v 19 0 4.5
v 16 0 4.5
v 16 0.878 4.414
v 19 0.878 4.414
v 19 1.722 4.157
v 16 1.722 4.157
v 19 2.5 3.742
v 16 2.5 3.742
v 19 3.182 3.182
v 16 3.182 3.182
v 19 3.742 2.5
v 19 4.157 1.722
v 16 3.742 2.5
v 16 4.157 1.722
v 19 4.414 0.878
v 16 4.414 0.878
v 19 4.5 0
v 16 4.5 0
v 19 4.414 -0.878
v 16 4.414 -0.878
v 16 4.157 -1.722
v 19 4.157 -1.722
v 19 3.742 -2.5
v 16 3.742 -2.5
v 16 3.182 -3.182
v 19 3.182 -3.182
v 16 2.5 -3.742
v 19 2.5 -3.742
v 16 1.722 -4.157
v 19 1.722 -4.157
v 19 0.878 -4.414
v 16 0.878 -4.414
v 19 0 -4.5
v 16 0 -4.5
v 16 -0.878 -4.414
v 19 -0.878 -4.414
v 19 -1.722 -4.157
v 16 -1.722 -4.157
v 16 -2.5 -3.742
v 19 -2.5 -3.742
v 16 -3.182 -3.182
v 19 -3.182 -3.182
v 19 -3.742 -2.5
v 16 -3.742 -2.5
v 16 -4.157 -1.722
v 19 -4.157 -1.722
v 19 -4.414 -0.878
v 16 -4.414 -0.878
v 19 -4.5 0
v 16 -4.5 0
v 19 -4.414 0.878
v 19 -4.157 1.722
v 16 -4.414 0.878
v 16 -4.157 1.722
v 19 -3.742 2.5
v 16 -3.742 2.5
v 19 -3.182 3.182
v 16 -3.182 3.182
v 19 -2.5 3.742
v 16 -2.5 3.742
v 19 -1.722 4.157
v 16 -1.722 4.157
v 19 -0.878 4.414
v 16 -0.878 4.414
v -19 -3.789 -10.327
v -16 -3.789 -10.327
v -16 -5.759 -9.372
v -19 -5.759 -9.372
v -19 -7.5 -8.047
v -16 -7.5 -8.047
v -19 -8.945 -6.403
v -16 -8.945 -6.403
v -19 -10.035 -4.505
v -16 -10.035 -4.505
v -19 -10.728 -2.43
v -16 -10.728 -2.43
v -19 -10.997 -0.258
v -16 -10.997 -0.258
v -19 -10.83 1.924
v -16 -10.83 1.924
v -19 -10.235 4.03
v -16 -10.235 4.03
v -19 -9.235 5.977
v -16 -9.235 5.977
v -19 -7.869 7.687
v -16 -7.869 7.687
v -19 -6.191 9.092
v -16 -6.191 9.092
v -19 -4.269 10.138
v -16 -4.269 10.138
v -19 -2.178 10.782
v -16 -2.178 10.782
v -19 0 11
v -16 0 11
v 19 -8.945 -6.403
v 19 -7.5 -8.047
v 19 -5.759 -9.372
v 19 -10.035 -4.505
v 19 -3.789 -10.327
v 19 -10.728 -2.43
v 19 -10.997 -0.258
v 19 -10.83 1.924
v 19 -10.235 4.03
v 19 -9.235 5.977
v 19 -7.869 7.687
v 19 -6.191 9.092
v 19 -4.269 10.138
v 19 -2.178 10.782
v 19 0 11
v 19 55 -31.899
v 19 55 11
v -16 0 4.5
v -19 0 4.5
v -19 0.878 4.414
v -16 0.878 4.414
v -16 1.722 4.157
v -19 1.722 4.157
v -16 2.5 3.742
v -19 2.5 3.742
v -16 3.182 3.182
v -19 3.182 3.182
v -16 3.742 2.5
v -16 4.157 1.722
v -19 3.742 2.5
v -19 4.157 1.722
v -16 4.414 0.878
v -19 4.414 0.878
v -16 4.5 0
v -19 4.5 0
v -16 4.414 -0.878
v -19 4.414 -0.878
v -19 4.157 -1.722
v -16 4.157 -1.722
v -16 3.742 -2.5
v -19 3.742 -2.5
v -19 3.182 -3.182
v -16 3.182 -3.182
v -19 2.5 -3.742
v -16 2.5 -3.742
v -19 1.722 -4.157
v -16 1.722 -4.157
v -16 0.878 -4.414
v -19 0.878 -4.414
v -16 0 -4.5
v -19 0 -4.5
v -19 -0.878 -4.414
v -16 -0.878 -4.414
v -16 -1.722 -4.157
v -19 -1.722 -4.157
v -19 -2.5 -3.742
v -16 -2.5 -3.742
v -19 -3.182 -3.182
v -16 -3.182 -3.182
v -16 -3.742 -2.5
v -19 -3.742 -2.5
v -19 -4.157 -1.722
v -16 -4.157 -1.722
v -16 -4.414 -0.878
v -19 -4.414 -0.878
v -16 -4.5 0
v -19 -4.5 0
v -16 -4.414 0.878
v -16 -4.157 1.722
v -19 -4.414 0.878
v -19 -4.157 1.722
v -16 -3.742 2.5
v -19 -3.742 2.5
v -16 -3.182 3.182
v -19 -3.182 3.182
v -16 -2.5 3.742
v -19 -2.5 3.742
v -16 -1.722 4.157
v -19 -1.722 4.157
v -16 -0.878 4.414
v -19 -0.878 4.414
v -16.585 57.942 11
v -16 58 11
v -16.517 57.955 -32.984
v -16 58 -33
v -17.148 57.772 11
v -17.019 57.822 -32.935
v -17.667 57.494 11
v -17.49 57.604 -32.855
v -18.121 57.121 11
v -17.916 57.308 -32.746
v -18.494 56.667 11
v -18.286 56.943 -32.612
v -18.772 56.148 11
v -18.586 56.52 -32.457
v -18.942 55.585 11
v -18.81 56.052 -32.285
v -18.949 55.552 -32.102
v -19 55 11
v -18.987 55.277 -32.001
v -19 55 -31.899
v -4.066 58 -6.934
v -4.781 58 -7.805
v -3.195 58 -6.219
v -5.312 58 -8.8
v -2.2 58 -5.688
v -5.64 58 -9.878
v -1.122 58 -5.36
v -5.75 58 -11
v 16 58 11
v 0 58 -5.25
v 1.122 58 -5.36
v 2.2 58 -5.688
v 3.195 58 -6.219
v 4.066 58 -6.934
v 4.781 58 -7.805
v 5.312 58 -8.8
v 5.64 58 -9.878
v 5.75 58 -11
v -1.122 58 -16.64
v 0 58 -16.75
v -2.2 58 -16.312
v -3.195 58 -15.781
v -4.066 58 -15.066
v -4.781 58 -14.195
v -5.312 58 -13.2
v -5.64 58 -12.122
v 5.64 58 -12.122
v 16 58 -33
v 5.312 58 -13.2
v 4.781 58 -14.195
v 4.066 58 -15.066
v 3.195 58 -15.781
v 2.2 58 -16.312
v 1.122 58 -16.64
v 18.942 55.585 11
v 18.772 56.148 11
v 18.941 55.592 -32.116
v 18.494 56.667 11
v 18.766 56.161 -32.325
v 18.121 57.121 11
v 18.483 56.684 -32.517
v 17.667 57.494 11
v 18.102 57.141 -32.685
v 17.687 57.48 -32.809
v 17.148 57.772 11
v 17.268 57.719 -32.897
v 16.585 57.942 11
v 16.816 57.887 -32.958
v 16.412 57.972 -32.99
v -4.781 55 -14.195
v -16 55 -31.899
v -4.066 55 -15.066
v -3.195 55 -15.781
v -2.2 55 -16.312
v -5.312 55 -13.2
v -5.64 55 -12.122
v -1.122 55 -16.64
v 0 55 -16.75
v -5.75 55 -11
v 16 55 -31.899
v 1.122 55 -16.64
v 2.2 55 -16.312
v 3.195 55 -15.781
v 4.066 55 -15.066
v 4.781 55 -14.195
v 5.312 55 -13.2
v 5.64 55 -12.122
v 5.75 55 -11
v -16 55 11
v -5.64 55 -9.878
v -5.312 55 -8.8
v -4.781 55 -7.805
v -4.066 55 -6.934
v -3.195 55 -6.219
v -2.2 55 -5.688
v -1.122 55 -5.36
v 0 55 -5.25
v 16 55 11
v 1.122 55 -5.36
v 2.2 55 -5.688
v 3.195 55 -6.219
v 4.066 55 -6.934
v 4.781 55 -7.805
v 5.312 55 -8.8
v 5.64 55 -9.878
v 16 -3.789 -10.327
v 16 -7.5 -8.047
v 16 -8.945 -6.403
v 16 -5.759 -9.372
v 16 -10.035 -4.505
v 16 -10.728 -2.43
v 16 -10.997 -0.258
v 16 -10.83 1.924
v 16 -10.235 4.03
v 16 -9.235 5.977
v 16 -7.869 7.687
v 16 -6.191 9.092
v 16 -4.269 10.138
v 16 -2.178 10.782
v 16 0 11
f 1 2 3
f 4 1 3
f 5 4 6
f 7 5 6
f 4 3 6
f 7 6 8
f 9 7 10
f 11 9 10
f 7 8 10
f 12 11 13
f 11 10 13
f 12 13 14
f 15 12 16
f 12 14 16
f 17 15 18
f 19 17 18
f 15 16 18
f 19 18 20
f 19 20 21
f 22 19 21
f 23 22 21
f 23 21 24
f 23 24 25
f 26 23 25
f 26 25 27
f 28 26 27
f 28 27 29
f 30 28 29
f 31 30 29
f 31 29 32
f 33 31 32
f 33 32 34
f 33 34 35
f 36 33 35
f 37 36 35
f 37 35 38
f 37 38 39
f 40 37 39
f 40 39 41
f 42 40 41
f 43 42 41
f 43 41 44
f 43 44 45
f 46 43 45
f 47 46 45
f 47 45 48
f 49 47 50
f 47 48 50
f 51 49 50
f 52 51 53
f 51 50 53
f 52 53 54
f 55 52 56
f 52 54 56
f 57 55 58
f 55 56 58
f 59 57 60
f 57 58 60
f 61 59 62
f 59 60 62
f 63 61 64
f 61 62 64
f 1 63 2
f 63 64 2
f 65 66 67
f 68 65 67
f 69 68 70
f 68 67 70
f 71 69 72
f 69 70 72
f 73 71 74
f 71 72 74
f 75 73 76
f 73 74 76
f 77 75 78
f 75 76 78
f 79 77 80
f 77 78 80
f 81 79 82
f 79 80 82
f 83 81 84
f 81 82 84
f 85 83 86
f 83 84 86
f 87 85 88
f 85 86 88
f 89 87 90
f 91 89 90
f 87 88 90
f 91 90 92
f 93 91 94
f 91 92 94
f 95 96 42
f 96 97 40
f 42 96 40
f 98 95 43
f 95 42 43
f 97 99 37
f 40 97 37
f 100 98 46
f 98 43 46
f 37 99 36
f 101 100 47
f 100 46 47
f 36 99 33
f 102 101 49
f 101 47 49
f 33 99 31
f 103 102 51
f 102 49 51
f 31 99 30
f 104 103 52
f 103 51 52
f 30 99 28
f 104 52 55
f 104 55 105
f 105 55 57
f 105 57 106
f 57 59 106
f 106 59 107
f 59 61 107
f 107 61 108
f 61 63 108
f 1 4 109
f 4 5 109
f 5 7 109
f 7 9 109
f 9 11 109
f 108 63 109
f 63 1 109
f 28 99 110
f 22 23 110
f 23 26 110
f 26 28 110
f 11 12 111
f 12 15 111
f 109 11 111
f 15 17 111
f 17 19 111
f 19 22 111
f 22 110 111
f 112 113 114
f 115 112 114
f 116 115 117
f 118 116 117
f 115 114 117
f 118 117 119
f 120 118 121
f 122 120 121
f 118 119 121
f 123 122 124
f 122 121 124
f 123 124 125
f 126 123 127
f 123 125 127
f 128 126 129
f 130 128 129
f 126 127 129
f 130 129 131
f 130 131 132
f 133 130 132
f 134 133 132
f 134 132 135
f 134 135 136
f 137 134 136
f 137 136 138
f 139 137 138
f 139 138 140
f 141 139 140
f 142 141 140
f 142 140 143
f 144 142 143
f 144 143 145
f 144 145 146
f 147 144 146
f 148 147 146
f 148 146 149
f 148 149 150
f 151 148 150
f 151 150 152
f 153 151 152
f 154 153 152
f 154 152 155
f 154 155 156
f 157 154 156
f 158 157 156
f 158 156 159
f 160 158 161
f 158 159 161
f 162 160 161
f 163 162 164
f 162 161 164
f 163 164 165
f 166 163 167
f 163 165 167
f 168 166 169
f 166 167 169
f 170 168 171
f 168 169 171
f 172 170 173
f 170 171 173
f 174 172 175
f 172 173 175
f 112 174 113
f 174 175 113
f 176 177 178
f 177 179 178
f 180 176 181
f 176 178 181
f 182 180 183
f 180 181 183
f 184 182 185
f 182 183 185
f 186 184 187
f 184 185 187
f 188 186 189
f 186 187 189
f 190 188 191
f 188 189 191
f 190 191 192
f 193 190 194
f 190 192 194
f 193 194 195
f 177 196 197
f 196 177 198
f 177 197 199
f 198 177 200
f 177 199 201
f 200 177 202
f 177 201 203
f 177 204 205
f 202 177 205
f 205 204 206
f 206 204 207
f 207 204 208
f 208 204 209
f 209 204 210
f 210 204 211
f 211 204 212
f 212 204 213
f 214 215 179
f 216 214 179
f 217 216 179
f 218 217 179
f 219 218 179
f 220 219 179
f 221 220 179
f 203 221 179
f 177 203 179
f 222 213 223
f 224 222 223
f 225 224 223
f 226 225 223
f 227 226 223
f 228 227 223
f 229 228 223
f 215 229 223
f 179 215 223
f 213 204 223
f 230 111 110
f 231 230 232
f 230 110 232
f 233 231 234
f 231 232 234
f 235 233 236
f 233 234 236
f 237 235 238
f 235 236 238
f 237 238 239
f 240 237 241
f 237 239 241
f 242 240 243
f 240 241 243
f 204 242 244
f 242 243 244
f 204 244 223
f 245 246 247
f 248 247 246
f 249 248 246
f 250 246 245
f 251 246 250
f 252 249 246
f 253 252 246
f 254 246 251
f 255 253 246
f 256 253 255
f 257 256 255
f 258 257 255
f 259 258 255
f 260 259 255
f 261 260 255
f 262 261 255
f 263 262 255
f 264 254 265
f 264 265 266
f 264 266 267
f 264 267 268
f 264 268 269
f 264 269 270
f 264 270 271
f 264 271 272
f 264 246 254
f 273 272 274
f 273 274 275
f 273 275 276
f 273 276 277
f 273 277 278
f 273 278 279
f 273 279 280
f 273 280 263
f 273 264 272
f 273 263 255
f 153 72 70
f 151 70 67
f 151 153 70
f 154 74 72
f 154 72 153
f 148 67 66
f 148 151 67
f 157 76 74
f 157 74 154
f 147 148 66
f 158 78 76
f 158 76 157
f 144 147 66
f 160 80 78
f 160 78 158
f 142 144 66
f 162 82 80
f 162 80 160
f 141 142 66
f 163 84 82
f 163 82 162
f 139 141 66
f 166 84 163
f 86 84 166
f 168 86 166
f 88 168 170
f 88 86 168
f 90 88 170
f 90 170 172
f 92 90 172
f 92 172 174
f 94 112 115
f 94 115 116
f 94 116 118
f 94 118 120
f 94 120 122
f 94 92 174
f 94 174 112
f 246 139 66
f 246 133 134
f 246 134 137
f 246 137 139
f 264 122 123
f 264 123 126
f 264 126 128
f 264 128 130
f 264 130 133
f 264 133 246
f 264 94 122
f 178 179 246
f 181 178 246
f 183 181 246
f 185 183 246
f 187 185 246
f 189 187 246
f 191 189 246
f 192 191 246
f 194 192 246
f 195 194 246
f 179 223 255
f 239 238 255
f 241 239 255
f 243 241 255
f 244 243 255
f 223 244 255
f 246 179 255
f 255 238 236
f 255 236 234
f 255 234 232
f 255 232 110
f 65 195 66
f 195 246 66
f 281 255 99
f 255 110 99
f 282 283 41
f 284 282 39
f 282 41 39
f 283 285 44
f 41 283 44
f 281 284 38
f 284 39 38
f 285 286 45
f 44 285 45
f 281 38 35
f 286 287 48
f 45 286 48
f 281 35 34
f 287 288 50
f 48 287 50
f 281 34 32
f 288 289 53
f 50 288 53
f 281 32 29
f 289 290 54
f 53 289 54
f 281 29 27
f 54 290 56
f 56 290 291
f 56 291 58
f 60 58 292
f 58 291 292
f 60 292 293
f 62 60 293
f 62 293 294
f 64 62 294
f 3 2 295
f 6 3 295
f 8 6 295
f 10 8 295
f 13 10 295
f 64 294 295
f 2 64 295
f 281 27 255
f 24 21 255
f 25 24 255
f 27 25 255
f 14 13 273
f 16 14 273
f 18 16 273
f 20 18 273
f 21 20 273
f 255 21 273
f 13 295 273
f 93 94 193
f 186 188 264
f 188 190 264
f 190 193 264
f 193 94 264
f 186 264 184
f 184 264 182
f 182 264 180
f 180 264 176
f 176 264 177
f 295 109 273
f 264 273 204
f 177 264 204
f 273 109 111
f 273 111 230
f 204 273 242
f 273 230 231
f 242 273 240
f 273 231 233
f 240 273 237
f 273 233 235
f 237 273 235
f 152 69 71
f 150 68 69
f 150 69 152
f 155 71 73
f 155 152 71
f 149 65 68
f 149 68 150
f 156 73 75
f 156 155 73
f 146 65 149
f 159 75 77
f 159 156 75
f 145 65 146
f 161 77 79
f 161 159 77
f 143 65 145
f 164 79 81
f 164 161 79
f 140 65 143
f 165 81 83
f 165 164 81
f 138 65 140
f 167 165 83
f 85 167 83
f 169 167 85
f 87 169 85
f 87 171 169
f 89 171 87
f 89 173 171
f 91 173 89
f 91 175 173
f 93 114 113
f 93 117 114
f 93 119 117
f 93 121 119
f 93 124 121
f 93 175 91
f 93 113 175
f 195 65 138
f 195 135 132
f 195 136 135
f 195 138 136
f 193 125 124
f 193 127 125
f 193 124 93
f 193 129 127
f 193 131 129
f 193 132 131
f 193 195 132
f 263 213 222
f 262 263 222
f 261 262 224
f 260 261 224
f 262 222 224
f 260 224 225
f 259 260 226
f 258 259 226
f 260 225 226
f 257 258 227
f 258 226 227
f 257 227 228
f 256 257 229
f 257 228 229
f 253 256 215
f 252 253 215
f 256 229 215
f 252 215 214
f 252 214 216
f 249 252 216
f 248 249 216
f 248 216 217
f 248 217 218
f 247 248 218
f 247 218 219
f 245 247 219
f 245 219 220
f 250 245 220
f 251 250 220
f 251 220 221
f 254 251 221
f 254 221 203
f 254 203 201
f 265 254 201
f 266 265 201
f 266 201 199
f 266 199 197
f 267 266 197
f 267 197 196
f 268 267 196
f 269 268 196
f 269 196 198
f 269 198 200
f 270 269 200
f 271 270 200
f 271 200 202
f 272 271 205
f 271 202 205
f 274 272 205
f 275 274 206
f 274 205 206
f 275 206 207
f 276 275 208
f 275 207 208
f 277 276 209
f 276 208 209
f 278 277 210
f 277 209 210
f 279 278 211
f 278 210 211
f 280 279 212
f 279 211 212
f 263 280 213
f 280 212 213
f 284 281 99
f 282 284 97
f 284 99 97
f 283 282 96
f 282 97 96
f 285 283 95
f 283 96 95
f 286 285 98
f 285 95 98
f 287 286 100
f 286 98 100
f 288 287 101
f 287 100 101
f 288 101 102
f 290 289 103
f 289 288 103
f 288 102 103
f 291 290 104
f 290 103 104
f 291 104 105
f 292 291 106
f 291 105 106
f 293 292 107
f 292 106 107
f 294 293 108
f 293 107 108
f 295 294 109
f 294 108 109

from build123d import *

# Parameters (mm, degrees)
BOSS_EXTRUDE1_DEPTH = 19
SKETCH2_W           = 32
SKETCH2_H           = 55
CUT_EXTRUDE1_DEPTH  = 45
SKETCH3_W           = 32
SKETCH3_H           = 22.717187721
CUT_EXTRUDE2_DEPTH  = 12
SKETCH4_R           = 4.5
CUT_EXTRUDE3_DEPTH  = 39
CUT_EXTRUDE4_REACH  = 71
SKETCH5_R           = 5.75
FILLET1_R           = 3


with BuildPart() as part:
    # Sketch1 → Boss-Extrude1 (new body, symmetric)
    with BuildSketch(Plane(origin=(0, 0, 0), x_dir=(0, 0, -1), z_dir=(1, 0, 0))):
        with BuildLine():
            Line((-11, 0), (-11, 58))
            Line((-11, 58), (33, 58))
            Line((33, 58), (10.326710033, -3.789335019))
            ThreePointArc((10.326710033, -3.789335019), (-1.924342697, -10.830369577), (-11, 0))
        make_face()
    extrude(amount=BOSS_EXTRUDE1_DEPTH, both=True)

    # Sketch2 → Cut-Extrude1 (cut, through all)
    with BuildSketch(Plane.XY.offset(11)):
        with Locations((0, 27.5)):
            Rectangle(SKETCH2_W, SKETCH2_H)
    extrude(amount=-CUT_EXTRUDE1_DEPTH, mode=Mode.SUBTRACT)

    # Sketch3 → Cut-Extrude2 (cut, through all)
    with BuildSketch(Plane(origin=(0, 0, 0), x_dir=(1, 0, 0), z_dir=(0, 1, 0))):
        with Locations((0, 0.358593861)):
            Rectangle(SKETCH3_W, SKETCH3_H)
    extrude(amount=-CUT_EXTRUDE2_DEPTH, mode=Mode.SUBTRACT)

    # Sketch4 → Cut-Extrude3 (cut, through all)
    with BuildSketch(Plane.ZY.offset(19)):
        Circle(SKETCH4_R)
    extrude(amount=-CUT_EXTRUDE3_DEPTH, mode=Mode.SUBTRACT)

    # Sketch5 → Cut-Extrude4 (cut, up to next)
    with BuildSketch(Plane(origin=(0, 58, 0), x_dir=(1, 0, 0), z_dir=(0, 1, 0)), mode=Mode.PRIVATE) as cut_extrude4_sk1:
        with Locations((0, 11)):
            Circle(SKETCH5_R)
    cut_extrude4_tool1 = extrude(cut_extrude4_sk1.sketch, amount=-CUT_EXTRUDE4_REACH, mode=Mode.PRIVATE) & part.part
    add(cut_extrude4_tool1.solids().sort_by_distance((0, 58, -11))[0], mode=Mode.SUBTRACT)

    # Fillet1
    fillet1_edges = [part.edges().sort_by_distance(p)[0] for p in [
        (19, 58, -11),
        (-19, 58, -11),
    ]]
    fillet(fillet1_edges, radius=FILLET1_R)


solid = part.part
